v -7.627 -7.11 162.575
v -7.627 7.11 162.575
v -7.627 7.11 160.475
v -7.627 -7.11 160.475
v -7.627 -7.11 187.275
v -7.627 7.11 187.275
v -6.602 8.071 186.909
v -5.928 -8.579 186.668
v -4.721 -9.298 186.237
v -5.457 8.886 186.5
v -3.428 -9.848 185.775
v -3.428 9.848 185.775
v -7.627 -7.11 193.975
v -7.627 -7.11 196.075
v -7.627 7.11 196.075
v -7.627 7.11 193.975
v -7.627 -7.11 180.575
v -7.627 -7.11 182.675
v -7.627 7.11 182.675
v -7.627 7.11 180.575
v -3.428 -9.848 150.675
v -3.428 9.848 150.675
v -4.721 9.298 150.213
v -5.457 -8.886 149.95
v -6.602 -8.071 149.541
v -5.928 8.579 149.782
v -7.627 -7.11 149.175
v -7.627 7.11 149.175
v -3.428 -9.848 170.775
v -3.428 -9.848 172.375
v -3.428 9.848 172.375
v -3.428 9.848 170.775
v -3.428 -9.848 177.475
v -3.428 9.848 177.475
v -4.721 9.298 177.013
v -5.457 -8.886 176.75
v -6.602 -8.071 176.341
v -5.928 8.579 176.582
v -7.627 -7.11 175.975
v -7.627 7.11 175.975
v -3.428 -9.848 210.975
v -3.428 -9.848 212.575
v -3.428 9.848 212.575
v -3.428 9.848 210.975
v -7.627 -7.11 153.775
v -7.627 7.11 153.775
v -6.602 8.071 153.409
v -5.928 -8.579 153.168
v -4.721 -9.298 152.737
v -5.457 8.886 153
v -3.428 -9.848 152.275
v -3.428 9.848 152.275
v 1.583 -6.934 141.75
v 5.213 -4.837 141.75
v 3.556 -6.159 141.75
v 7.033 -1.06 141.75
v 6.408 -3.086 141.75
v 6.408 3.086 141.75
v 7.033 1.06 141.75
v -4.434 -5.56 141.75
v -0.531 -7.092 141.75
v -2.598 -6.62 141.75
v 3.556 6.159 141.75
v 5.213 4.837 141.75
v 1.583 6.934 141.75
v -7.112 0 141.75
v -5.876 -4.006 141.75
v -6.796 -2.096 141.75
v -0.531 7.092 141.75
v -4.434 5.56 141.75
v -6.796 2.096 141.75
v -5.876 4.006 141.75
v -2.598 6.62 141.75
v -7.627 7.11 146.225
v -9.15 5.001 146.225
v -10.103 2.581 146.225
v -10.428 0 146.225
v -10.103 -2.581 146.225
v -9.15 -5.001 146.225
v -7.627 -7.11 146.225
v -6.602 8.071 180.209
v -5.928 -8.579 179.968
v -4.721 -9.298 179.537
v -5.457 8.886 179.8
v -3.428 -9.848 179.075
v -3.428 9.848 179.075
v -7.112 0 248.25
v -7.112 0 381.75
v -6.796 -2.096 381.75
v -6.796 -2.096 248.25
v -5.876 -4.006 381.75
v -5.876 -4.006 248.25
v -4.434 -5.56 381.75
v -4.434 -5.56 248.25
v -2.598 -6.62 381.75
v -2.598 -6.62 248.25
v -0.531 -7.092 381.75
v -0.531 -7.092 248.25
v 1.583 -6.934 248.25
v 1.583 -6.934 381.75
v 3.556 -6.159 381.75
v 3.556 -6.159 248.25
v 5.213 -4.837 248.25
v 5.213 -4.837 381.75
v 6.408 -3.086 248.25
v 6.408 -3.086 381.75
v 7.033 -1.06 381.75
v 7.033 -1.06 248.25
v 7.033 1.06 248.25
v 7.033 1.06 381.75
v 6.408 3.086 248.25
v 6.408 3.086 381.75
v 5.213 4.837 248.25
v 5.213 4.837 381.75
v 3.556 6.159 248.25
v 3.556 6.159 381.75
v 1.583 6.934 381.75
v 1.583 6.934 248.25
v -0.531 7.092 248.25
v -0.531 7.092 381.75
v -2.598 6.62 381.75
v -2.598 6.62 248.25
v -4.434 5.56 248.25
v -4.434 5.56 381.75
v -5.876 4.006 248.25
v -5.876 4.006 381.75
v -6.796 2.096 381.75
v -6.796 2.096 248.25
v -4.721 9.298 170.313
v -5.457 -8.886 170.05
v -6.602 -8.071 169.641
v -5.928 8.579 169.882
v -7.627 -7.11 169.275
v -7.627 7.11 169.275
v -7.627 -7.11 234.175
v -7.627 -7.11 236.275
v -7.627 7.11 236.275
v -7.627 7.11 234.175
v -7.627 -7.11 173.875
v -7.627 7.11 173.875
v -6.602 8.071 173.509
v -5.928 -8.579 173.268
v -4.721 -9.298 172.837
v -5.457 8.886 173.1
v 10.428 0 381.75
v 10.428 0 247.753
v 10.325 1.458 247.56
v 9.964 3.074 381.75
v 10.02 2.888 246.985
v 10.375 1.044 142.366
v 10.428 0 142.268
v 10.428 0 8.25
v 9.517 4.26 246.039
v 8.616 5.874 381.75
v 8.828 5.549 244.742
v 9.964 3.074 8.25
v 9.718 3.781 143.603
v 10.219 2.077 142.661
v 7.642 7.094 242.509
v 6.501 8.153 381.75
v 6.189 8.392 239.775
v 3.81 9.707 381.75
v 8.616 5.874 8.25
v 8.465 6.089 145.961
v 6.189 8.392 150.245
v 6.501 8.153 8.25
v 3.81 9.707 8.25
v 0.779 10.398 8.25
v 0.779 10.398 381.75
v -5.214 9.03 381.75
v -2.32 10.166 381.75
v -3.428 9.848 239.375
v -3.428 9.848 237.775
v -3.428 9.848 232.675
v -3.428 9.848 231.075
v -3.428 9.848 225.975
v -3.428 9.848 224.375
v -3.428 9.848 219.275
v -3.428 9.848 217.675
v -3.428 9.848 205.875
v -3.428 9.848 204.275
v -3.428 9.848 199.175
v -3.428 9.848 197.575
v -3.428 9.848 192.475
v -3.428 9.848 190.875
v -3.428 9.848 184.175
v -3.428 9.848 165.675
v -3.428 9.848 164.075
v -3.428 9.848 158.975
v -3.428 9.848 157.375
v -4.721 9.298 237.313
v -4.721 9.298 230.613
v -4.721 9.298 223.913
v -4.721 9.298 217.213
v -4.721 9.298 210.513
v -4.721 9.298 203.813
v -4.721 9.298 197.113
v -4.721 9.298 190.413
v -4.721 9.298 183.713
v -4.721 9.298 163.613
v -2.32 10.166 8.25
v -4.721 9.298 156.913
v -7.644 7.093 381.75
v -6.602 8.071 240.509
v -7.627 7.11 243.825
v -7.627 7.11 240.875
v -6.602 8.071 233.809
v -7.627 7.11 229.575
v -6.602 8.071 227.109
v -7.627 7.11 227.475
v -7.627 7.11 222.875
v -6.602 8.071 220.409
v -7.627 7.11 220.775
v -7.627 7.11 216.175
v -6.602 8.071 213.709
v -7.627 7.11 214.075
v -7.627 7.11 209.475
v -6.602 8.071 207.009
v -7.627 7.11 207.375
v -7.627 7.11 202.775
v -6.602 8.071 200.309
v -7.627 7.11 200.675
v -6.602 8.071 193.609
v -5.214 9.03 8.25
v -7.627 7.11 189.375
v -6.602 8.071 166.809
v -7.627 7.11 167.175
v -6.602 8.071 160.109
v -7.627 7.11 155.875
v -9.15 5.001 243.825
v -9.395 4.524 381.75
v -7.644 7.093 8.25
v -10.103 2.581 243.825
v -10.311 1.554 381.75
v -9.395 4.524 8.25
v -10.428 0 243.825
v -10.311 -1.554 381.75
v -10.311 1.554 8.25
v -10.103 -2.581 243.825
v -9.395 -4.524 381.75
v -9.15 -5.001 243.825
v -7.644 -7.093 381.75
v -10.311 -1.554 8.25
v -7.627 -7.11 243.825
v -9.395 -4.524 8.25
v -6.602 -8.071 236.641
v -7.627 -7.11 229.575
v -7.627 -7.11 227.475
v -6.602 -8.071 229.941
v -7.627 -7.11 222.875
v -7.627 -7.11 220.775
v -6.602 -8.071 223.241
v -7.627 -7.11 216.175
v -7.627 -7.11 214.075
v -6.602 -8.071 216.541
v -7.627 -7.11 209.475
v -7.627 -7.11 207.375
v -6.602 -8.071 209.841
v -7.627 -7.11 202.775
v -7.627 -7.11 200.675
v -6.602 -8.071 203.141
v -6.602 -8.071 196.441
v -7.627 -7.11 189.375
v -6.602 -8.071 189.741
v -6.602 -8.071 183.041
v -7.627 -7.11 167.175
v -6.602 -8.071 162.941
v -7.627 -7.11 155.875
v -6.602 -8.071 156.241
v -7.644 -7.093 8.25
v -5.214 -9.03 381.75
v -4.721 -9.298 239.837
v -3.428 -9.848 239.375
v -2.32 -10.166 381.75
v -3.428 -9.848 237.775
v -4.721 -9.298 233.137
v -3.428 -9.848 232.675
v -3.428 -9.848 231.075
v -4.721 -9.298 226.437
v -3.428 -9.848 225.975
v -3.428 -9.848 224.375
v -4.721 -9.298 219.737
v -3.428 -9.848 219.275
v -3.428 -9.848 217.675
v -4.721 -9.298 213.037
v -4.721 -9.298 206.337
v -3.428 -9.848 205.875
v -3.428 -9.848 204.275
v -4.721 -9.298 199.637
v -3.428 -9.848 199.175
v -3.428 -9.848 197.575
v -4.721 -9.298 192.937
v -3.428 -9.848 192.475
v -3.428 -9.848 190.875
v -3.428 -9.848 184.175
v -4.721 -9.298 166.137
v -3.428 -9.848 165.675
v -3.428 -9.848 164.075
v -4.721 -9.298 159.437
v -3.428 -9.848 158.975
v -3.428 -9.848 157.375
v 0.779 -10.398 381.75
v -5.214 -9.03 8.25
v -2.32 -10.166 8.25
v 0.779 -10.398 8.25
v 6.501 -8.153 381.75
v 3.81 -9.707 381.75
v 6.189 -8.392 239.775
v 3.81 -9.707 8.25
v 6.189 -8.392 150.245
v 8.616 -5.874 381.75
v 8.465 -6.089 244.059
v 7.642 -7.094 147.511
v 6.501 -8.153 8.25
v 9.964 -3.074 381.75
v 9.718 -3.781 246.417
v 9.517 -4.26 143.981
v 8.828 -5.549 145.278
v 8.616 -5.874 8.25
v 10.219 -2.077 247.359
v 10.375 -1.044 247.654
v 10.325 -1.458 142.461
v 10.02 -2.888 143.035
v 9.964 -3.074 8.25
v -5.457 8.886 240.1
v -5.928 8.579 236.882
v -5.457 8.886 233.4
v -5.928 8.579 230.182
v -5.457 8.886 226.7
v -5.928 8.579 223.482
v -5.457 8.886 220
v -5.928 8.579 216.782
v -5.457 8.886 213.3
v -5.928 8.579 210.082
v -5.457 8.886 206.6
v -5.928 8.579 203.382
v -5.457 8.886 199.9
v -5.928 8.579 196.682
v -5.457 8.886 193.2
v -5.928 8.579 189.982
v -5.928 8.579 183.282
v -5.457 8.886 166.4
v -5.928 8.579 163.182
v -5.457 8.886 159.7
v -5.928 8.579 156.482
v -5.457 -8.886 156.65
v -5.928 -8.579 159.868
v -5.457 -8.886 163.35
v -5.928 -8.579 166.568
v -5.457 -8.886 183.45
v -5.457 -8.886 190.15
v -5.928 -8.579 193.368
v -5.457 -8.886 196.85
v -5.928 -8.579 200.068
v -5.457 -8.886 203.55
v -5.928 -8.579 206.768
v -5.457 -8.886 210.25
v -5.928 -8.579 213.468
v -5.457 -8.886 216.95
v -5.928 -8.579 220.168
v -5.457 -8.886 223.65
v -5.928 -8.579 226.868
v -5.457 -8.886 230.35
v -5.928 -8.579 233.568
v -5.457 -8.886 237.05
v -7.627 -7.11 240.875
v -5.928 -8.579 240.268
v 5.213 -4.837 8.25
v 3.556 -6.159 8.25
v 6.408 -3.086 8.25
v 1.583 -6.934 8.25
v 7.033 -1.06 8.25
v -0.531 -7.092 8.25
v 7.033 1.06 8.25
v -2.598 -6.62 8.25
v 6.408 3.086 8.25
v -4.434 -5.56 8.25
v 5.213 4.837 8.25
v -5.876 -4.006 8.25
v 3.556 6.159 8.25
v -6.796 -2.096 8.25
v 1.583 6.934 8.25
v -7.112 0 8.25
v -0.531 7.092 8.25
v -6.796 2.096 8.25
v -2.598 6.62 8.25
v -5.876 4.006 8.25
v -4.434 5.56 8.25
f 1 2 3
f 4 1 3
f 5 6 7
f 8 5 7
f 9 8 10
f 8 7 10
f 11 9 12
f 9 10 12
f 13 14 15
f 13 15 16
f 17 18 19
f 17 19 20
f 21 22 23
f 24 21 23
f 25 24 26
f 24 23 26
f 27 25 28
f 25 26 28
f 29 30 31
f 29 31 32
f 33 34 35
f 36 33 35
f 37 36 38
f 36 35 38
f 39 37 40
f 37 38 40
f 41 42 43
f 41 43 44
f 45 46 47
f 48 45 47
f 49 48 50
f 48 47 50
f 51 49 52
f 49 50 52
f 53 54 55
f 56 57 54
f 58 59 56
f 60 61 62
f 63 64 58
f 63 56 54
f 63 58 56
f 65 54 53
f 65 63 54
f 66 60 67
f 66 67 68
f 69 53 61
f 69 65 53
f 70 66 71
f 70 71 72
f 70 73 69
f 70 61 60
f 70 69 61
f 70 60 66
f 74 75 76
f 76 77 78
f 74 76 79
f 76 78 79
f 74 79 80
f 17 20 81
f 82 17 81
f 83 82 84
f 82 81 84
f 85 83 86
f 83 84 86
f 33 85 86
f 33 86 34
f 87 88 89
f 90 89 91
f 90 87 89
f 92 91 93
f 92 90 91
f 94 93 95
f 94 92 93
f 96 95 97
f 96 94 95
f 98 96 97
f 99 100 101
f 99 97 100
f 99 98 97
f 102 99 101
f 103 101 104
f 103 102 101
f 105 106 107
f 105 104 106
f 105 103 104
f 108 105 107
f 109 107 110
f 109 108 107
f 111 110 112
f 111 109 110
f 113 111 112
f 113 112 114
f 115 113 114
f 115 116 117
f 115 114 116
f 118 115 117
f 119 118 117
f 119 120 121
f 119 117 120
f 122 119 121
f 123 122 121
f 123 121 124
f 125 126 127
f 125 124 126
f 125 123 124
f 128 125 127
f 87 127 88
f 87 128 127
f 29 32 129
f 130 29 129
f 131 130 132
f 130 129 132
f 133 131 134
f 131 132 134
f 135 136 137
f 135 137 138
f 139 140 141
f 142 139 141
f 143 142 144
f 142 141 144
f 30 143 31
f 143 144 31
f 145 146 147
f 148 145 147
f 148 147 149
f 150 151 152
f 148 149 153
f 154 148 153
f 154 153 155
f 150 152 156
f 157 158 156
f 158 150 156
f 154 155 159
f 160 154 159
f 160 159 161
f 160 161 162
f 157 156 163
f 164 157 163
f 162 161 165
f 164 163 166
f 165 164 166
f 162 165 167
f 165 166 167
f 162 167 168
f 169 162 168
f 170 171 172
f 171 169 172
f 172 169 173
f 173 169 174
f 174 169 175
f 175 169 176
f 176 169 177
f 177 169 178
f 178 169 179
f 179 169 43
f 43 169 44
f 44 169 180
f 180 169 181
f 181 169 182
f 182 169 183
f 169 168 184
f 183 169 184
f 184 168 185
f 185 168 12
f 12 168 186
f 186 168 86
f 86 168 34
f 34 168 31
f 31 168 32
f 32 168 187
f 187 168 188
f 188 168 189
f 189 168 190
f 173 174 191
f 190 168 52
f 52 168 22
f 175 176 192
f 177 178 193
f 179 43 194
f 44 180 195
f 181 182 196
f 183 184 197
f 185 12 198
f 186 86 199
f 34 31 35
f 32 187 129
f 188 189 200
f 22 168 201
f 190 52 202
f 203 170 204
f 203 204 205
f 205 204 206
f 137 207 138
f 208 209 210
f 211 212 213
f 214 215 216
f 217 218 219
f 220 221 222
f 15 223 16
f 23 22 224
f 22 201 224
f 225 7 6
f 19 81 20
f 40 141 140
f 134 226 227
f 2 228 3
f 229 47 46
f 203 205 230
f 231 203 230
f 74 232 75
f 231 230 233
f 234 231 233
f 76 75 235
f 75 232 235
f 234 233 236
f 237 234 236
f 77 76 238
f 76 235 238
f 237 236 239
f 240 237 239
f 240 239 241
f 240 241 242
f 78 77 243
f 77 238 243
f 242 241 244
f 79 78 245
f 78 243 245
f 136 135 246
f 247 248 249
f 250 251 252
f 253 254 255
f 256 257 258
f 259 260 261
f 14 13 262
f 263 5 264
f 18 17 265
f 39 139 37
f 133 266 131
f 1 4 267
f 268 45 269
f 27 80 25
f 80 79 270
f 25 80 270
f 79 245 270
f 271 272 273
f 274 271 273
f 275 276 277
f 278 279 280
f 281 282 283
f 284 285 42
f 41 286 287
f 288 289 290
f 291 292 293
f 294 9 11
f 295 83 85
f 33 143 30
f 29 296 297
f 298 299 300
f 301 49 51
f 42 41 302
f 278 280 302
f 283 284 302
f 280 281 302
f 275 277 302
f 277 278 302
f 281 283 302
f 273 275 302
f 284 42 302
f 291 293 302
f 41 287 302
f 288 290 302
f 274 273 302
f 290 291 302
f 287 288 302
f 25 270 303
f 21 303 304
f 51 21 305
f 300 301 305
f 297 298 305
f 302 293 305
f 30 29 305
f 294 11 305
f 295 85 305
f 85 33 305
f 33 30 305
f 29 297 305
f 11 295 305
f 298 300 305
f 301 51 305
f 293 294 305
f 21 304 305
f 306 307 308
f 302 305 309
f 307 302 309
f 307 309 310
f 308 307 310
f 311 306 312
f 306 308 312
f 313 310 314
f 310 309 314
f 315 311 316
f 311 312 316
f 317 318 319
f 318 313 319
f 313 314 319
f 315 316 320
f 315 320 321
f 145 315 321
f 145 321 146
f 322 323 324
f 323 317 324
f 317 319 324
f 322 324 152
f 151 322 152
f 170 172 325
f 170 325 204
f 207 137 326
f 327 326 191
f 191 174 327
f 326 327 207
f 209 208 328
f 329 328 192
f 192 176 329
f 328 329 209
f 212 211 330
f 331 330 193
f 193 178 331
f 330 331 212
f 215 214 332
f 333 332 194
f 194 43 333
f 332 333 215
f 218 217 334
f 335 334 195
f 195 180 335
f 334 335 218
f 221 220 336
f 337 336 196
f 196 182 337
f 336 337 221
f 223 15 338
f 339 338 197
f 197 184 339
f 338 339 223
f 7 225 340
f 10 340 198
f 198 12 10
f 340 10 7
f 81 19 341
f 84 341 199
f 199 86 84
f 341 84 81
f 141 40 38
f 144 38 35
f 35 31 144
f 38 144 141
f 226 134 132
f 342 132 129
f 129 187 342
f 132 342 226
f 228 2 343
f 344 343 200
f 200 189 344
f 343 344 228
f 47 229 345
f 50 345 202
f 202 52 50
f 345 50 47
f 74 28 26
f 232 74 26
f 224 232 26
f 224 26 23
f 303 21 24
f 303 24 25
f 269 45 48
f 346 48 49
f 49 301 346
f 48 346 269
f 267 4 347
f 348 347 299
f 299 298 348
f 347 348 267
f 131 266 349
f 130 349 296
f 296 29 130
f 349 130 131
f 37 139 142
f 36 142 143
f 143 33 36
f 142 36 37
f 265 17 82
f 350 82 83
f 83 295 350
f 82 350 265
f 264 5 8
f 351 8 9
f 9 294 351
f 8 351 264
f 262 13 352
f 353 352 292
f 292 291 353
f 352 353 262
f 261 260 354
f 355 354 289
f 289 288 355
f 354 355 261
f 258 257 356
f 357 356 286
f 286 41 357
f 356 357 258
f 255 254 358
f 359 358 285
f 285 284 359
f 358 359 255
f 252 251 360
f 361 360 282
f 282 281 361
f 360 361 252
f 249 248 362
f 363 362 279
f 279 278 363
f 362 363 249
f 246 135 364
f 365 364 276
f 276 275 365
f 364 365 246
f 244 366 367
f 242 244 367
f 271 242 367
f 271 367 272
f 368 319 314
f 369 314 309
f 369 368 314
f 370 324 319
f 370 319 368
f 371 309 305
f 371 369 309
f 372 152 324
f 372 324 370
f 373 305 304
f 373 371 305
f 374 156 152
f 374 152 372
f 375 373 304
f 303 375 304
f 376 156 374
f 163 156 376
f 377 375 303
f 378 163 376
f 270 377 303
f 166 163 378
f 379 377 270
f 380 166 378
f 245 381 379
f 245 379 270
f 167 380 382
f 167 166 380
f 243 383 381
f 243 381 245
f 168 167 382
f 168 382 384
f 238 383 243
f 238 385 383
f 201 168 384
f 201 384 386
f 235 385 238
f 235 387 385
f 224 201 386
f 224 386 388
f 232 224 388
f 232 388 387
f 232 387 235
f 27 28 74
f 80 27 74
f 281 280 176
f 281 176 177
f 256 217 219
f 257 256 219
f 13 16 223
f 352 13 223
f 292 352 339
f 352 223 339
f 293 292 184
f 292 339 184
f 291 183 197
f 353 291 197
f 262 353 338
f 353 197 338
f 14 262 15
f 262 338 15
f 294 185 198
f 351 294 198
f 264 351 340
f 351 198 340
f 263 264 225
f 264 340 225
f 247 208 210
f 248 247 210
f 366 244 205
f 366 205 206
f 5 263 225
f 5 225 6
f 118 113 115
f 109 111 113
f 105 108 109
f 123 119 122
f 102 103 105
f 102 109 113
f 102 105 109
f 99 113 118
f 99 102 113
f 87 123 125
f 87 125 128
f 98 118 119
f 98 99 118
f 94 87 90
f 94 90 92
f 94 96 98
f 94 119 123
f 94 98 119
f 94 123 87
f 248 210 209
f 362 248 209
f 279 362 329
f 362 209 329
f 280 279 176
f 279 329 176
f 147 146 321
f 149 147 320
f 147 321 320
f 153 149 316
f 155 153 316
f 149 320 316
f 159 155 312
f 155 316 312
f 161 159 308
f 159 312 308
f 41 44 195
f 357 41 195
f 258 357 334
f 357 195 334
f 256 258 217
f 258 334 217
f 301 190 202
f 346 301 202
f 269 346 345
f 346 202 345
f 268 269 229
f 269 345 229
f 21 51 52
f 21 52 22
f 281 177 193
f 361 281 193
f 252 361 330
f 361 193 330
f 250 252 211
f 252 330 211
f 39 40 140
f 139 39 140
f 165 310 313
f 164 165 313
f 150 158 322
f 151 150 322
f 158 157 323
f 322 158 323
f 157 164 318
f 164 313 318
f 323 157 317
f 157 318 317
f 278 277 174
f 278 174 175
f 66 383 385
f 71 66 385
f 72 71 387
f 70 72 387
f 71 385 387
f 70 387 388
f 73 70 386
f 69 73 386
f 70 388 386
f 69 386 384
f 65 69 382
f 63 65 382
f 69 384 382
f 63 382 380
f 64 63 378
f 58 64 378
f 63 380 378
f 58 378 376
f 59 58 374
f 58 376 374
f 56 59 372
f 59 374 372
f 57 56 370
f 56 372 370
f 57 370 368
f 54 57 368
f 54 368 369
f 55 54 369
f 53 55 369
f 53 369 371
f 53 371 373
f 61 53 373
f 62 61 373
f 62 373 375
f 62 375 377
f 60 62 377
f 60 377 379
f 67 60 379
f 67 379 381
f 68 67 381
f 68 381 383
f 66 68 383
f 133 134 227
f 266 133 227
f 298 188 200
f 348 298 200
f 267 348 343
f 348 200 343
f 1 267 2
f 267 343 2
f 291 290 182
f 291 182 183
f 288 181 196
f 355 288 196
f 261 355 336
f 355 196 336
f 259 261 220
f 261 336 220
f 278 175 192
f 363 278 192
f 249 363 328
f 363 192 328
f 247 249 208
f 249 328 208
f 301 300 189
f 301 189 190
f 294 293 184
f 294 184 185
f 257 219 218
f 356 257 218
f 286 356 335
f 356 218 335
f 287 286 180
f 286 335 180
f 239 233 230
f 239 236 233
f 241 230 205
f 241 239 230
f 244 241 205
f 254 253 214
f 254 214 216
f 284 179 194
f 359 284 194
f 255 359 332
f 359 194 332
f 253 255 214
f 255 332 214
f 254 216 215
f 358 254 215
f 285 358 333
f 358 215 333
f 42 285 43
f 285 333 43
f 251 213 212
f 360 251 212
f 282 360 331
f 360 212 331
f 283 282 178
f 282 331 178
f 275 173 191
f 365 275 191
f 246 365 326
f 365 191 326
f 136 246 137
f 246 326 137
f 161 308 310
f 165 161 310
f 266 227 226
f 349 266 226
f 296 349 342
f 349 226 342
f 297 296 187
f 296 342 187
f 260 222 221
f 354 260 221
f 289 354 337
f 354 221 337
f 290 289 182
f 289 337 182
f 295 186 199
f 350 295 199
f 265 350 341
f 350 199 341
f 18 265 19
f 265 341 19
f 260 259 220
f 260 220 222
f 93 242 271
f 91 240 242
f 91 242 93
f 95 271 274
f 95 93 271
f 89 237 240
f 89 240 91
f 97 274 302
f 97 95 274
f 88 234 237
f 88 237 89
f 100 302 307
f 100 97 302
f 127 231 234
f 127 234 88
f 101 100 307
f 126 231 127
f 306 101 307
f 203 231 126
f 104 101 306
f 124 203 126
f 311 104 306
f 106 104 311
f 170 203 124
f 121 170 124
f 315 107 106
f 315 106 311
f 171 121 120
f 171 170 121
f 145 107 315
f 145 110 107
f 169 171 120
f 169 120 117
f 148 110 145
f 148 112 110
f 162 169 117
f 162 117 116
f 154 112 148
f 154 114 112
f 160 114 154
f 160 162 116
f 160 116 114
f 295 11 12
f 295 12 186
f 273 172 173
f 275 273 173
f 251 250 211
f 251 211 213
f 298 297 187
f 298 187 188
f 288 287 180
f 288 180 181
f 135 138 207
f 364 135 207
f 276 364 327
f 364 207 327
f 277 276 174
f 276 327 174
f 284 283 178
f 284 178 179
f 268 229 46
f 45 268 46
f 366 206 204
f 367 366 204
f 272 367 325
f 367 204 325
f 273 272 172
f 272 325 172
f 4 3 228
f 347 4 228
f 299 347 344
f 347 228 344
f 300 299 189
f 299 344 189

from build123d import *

# Parameters (mm, degrees)
SKETCH1_R               = 10.4275
BOSS_EXTRUDE1_DEPTH     = 390
SKETCH2_R               = 7.112
CUT_EXTRUDE1_DEPTH      = 141.75
CUT_EXTRUDE2_START      = -141.75
SKETCH3_R               = 7.112
CUT_EXTRUDE2_DEPTH      = 141.75
CUT_EXTRUDE3_DEPTH      = 20
CUT_EXTRUDE3_DEPTH_BACK = 20
SKETCH4_W               = 2.8
SKETCH4_H               = 97.6
CUT_EXTRUDE4_DEPTH      = 20
LPATTERN1_COUNT         = 14
LPATTERN1_PITCH         = 6.7
SKETCH6_W               = 24.776384874
SKETCH6_H               = 25.11648024
CUT_EXTRUDE5_DEPTH      = 8.25
SKETCH7_W               = 32.905320966
SKETCH7_H               = 32.372251486
CUT_EXTRUDE6_DEPTH      = 8.25


with BuildPart() as part:
    # Sketch1 → Boss-Extrude1 (new body)
    with BuildSketch(Plane.XY):
        Circle(SKETCH1_R)
    extrude(amount=BOSS_EXTRUDE1_DEPTH)

    # Sketch2 → Cut-Extrude1 (cut)
    with BuildSketch(Plane(origin=(0, 0, 0), x_dir=(-1, 0, 0), z_dir=(0, 0, -1))):
        Circle(SKETCH2_R)
    extrude(amount=-CUT_EXTRUDE1_DEPTH, mode=Mode.SUBTRACT)

    # Sketch3 → Cut-Extrude2 (cut)
    with BuildSketch(Plane.XY.offset(390).offset(CUT_EXTRUDE2_START)):
        Circle(SKETCH3_R)
    extrude(amount=CUT_EXTRUDE2_DEPTH, mode=Mode.SUBTRACT)

    # Sketch4 → Cut-Extrude3 (cut, two sides: drawn at the far end of the back side and taken through both)
    with BuildSketch(Plane(origin=(0, 0, 0), x_dir=(1, 0, 0), z_dir=(0, 1, 0)).offset(-CUT_EXTRUDE3_DEPTH_BACK)):
        Polygon((6.189444989, -239.775), (6.189444989, -150.245179393), (10.438224829, -142.247476164), (10.438224829, -247.772703229), align=None)
        with Locations((-9.0275, -195.025)):
            Rectangle(SKETCH4_W, SKETCH4_H)
    extrude(amount=CUT_EXTRUDE3_DEPTH + CUT_EXTRUDE3_DEPTH_BACK, mode=Mode.SUBTRACT)

    # Sketch5 → Cut-Extrude4 (cut, symmetric)
    with BuildSketch(Plane(origin=(0, 0, 0), x_dir=(1, 0, 0), z_dir=(0, 1, 0))):
        Polygon((-3.4275, -152.275), (-3.4275, -150.675), (-7.6275, -149.175), (-7.6275, -153.775), align=None)
    cut_extrude4 = extrude(amount=CUT_EXTRUDE4_DEPTH, both=True, mode=Mode.SUBTRACT)

    # LPattern1: Cut-Extrude4 ×14
    with Locations(*[(0, 0, i * LPATTERN1_PITCH) for i in range(1, LPATTERN1_COUNT)]):
        add(cut_extrude4, mode=Mode.SUBTRACT)

    # Sketch6 → Cut-Extrude5 (cut)
    with BuildSketch(Plane.XY.offset(390)):
        Rectangle(SKETCH6_W, SKETCH6_H)
    extrude(amount=-CUT_EXTRUDE5_DEPTH, mode=Mode.SUBTRACT)

    # Sketch7 → Cut-Extrude6 (cut)
    with BuildSketch(Plane(origin=(0, 0, 0), x_dir=(-1, 0, 0), z_dir=(0, 0, -1))):
        Rectangle(SKETCH7_W, SKETCH7_H)
    extrude(amount=-CUT_EXTRUDE6_DEPTH, mode=Mode.SUBTRACT)


solid = part.part
